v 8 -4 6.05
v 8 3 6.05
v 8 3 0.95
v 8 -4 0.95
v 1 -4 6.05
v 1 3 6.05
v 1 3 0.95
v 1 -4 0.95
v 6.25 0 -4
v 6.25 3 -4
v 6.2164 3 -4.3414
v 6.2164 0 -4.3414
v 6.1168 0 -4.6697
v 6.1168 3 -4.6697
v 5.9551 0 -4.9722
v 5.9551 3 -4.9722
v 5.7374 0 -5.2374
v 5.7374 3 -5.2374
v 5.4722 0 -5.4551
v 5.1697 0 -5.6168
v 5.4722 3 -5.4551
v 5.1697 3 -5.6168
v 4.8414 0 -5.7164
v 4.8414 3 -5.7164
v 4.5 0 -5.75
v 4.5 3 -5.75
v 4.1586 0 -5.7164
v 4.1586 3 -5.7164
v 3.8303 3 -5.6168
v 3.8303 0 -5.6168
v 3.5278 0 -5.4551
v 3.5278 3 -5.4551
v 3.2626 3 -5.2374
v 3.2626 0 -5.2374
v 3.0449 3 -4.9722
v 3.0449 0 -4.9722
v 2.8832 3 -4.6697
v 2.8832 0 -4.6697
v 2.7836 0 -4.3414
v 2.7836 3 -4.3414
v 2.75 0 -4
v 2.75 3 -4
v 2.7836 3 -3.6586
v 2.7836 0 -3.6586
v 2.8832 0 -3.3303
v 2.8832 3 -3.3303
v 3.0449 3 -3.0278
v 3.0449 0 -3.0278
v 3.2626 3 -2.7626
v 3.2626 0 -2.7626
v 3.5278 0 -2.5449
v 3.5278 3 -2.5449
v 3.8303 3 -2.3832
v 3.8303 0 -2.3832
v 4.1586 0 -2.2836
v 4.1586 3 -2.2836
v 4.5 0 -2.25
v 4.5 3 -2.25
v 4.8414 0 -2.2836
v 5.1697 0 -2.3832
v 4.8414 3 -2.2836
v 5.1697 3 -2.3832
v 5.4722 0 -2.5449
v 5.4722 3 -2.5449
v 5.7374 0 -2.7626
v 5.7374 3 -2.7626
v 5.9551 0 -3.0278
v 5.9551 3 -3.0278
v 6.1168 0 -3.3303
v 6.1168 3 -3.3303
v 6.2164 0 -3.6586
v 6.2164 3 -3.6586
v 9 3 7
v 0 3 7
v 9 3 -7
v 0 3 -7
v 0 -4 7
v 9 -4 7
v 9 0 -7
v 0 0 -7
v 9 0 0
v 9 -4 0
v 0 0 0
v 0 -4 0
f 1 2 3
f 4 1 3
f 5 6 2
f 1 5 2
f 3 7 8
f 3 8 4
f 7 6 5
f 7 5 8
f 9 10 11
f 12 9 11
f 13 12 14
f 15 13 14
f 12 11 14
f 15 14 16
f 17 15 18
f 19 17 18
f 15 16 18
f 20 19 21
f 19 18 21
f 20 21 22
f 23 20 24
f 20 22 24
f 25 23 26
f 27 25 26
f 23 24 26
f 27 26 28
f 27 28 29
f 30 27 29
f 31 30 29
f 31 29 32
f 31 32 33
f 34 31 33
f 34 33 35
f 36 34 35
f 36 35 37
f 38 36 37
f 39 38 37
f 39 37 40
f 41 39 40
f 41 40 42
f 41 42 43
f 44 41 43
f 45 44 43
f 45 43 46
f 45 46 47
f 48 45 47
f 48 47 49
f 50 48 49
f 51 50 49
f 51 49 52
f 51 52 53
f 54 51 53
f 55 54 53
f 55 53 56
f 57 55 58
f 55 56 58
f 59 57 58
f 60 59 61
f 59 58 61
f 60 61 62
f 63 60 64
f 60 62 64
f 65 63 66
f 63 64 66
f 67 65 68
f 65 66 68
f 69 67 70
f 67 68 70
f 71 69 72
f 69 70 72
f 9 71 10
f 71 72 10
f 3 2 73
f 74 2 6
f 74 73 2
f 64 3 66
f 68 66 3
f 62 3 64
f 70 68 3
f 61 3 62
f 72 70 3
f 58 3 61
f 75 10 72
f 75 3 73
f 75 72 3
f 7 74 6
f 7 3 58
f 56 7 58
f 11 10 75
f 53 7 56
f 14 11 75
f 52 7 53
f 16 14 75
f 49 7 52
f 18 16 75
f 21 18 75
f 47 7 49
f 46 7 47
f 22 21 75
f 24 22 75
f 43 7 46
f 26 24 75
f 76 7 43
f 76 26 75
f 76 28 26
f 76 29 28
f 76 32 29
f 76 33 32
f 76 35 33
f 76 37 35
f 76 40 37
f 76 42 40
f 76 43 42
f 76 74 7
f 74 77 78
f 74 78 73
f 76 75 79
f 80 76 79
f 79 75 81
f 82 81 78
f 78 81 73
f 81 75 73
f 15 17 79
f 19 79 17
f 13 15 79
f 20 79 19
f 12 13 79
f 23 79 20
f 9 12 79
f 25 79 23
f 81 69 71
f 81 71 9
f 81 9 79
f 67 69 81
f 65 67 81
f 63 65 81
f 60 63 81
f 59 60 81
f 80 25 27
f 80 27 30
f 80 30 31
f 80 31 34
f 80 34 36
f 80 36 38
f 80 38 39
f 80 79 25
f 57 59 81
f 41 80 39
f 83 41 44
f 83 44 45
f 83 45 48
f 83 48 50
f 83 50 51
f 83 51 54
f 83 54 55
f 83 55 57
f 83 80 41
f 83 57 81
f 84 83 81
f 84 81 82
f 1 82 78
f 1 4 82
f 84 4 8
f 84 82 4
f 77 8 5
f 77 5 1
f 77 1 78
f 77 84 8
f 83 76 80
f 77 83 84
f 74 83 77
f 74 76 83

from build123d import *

# Parameters (mm, degrees)
BOSS_EXTRUDE2_DEPTH = 9
SKETCH6_R           = 1.75
SKETCH6_W           = 7
SKETCH6_H           = 5.1
CUT_EXTRUDE1_DEPTH  = 8


with BuildPart() as part:
    # Sketch4 → Boss-Extrude2 (new body)
    with BuildSketch(Plane(origin=(0, 0, 0), x_dir=(0, 0, -1), z_dir=(1, 0, 0))):
        Polygon((0, 0), (0, -4), (-7, -4), (-7, 3), (7, 3), (7, 0), align=None)
    extrude(amount=BOSS_EXTRUDE2_DEPTH)

    # Sketch6 → Cut-Extrude1 (cut, through all)
    with BuildSketch(Plane(origin=(0, 3, 0), x_dir=(1, 0, 0), z_dir=(0, 1, 0))):
        with Locations((4.5, 4)):
            Circle(SKETCH6_R)
        with Locations((4.5, -3.5)):
            Rectangle(SKETCH6_W, SKETCH6_H)
    extrude(amount=-CUT_EXTRUDE1_DEPTH, mode=Mode.SUBTRACT)


solid = part.part
